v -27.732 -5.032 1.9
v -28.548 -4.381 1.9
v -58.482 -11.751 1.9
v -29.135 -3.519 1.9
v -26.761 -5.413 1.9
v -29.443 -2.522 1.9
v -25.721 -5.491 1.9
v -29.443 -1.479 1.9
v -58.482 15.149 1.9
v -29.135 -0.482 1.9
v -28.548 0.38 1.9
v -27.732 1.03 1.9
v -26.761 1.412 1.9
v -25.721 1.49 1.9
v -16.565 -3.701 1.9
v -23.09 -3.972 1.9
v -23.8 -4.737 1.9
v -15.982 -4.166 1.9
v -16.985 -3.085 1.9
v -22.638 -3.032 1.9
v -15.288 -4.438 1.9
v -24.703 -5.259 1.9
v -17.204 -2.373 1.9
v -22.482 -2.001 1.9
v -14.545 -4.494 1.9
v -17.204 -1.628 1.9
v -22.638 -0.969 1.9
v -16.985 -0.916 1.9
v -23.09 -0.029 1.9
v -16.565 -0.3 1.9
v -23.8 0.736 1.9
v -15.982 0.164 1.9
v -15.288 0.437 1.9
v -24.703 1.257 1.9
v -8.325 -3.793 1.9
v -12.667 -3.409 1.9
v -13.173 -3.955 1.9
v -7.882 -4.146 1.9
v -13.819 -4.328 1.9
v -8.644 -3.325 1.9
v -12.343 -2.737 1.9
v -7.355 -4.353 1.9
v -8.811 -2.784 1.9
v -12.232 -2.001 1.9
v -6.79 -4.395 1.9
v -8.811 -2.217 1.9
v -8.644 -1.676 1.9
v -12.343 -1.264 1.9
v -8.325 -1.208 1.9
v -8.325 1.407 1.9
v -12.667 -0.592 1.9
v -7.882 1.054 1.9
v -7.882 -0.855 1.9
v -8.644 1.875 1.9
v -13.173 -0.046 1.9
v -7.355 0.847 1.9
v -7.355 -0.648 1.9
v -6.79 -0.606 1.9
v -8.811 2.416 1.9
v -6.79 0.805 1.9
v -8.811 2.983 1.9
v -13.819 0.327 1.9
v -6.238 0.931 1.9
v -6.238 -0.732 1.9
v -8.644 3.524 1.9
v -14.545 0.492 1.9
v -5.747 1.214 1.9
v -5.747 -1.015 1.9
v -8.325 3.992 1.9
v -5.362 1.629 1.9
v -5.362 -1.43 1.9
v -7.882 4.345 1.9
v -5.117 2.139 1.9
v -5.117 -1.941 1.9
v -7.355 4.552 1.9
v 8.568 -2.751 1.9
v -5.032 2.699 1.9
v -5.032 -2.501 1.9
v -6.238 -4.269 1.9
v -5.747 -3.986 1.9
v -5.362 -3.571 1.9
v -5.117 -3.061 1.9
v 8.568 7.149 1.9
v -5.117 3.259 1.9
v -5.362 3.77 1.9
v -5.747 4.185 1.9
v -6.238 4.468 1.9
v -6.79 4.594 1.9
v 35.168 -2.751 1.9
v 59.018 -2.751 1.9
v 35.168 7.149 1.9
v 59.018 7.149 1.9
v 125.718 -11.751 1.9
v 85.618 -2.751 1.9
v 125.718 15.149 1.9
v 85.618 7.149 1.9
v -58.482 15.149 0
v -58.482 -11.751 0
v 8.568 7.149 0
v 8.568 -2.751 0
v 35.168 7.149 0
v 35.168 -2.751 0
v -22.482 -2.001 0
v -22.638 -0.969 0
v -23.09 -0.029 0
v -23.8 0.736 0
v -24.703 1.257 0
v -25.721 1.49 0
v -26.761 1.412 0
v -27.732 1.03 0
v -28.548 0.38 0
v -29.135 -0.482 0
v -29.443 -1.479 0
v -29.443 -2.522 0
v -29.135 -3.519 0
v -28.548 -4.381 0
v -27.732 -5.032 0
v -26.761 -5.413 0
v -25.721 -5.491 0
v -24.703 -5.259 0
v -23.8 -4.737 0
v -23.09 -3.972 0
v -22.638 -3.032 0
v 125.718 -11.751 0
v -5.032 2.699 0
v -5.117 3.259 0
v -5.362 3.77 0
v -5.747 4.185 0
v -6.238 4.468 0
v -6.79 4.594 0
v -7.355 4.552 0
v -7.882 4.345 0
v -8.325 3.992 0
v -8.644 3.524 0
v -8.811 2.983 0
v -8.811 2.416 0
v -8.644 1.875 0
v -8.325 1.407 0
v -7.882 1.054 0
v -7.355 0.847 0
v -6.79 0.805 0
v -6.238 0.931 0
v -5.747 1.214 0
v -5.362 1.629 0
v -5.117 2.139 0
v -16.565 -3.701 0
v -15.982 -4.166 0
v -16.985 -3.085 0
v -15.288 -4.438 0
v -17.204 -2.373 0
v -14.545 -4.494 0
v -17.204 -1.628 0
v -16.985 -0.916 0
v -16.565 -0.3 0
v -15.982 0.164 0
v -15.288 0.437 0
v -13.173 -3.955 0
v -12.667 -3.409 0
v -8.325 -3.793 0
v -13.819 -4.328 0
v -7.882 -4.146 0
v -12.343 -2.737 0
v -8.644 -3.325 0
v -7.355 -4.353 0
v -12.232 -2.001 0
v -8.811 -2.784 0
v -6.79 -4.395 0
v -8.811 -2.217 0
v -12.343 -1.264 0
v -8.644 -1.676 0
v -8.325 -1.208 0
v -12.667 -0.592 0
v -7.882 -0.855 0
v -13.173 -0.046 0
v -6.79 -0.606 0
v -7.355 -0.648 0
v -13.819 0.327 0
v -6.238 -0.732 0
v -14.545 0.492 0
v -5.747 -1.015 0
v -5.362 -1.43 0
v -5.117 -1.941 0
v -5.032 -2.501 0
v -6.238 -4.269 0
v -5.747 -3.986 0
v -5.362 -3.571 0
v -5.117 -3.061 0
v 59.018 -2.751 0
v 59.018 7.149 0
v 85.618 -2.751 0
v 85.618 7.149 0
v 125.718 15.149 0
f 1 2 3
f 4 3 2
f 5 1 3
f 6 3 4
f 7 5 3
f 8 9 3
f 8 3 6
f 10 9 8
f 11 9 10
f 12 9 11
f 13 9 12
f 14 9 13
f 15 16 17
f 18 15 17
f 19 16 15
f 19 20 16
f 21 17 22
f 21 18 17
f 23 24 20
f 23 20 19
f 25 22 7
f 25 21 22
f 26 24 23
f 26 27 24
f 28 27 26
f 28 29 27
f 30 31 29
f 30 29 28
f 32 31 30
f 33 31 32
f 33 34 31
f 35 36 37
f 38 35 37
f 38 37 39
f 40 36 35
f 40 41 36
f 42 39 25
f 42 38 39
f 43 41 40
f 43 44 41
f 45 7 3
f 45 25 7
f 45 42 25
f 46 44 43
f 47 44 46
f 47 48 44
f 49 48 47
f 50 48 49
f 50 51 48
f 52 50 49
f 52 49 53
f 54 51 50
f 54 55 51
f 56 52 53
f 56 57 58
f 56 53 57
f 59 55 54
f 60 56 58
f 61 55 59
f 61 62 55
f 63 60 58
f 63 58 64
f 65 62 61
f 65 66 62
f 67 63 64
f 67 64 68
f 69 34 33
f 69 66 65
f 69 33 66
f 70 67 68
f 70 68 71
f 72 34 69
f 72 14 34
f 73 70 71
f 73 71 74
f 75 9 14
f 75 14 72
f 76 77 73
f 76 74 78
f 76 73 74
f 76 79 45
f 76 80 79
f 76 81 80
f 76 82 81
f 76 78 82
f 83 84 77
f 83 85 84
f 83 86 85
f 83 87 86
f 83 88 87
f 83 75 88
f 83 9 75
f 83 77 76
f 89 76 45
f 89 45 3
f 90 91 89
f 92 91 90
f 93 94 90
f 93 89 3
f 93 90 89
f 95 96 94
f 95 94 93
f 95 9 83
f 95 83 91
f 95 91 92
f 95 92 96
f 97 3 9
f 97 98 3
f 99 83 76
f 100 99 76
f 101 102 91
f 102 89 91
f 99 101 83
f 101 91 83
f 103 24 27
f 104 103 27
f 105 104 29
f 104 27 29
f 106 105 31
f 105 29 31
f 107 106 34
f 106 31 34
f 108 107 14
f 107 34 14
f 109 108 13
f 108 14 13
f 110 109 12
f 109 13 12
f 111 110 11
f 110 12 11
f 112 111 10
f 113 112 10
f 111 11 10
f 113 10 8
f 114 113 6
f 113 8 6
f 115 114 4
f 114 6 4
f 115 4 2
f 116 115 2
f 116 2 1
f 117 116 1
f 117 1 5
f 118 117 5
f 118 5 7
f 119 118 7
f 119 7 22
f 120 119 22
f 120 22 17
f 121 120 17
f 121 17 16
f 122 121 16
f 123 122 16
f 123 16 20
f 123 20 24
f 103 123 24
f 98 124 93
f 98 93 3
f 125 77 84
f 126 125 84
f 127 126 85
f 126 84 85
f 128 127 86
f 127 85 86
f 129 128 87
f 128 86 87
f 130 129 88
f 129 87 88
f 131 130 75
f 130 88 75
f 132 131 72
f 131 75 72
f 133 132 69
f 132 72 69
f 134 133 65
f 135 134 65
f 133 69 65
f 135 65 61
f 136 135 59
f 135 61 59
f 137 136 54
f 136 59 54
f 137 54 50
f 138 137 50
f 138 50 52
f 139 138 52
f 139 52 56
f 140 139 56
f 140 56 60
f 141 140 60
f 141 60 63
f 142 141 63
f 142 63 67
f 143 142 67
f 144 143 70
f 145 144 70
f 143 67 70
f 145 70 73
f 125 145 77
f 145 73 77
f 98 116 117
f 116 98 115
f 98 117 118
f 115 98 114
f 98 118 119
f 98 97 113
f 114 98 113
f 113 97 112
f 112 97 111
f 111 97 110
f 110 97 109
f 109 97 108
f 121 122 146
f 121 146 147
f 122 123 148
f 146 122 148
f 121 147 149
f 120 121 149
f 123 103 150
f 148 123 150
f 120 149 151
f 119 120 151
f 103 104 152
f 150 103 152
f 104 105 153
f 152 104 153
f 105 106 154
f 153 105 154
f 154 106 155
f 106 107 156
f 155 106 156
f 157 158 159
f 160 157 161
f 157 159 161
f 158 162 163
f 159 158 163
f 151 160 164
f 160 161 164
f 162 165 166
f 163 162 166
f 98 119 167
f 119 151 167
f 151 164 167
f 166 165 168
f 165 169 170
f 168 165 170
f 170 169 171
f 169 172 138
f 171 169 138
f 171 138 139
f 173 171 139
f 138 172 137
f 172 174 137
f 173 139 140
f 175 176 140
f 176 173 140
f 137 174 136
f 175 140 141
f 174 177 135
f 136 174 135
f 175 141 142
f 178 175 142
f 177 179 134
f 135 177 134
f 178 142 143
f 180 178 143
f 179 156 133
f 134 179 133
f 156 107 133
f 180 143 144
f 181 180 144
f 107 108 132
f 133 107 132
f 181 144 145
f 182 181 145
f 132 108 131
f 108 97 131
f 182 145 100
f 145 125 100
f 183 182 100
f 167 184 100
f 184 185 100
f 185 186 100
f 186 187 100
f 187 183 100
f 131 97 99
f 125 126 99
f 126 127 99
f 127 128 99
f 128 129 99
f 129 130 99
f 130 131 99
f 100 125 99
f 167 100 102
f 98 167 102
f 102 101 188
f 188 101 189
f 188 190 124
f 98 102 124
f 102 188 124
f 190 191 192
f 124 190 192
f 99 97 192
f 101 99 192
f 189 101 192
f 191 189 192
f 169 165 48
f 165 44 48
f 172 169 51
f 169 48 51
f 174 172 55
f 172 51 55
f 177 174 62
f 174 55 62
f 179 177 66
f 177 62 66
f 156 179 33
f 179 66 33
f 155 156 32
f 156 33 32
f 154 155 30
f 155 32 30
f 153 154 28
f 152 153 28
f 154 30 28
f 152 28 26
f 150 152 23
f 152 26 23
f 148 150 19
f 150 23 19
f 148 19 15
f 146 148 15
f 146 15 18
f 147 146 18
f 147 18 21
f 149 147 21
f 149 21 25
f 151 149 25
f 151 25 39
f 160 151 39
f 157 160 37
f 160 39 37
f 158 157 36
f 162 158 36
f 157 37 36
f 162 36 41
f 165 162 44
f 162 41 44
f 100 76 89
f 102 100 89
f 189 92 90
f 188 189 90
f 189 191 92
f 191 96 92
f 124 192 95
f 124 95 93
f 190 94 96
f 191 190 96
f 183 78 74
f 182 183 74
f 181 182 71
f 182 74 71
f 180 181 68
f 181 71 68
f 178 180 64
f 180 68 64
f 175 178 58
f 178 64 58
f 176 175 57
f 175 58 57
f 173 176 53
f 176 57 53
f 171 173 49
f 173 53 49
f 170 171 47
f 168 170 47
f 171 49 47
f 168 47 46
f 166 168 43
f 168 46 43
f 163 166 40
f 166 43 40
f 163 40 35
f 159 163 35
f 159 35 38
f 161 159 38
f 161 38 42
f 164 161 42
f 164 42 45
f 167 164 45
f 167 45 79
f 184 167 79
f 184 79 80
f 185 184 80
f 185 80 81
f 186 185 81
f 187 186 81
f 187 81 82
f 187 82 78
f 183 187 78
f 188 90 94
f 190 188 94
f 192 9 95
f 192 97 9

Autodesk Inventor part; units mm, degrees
ref_plane "YZ Plane" through (0, 0, 0) normal (1, 0, 0) x (0, 1, 0)
ref_plane "XZ Plane" through (0, 0, 0) normal (0, 1, 0) x (-1, 0, 0)
ref_plane "XY Plane" through (0, 0, 0) normal (0, 0, 1) x (1, 0, 0)
sketch "Sketch1" plane through (0, 0, 0) normal (0, 0, 1) x (1, 0, 0)
  line L0 (-58.4821, 15.1494) -> (125.7179, 15.1494)
  line L1 (125.7179, 15.1494) -> (125.7179, -11.7506)
  line L2 (125.7179, -11.7506) -> (-58.4821, -11.7506)
  line L3 (-58.4821, -11.7506) -> (-58.4821, 15.1494)
  point P0 (0, 0)
  dimension "d0" = 184.2
  dimension "d2" = 26.9
extrude "Extrusion1" add sketch "Sketch1" along normal blind 1.9
sketch "Sketch5" plane through (0, 0, 1.9) normal (0, 0, 1) x (1, 0, 0)
  line L0 (-58.4821, 15.1494) -> (-58.4821, -11.7506) projected
  line L1 (-58.4821, -11.7506) -> (125.7179, -11.7506) projected
  line L2 (125.7179, -11.7506) -> (125.7179, 15.1494) projected
  circle A0 centre (-25.9821, -2.0006) radius 3.5
  circle A1 centre (-14.7321, -2.0006) radius 2.5
  circle A2 centre (-6.9321, -2.5006) radius 1.9
  circle A3 centre (-6.9321, 2.6994) radius 1.9
  line L3 (8.5679, -2.7506) -> (35.1679, -2.7506)
  line L4 (35.1679, -2.7506) -> (35.1679, 7.1494)
  line L5 (35.1679, 7.1494) -> (8.5679, 7.1494)
  line L6 (8.5679, 7.1494) -> (8.5679, -2.7506)
  line L7 (59.0179, -2.7506) -> (85.6179, -2.7506)
  line L8 (85.6179, -2.7506) -> (85.6179, 7.1494)
  line L9 (85.6179, 7.1494) -> (59.0179, 7.1494)
  line L10 (59.0179, 7.1494) -> (59.0179, -2.7506)
  point P0 (0, 0)
  dimension "d56" = 7
  dimension "d58" = 5
  dimension "d59" = 32.5
  dimension "d60" = 43.75
  dimension "d61" = 9.75
  dimension "d62" = 9.75
  dimension "d63" = 3.8
  dimension "d64" = 3.8
  dimension "d65" = 51.55
  dimension "d66" = 51.55
  dimension "d67" = 9.25
  dimension "d68" = 14.45
  dimension "d69" = 26.6
  dimension "d70" = 26.6
  dimension "d71" = 9.9
  dimension "d72" = 9.9
  dimension "d73" = 9
  dimension "d74" = 9
  dimension "d75" = 117.15
  dimension "d76" = 66.7
extrude "Extrusion3" cut sketch "Sketch5" against normal through all
equation "\"BendRadius\" = Thickness"
equation "\"BendReliefWidth\" = Thickness"
equation "\"BendReliefDepth\" = 0.5 * Thickness"
equation "\"CornerReliefSize\" = 4 * Thickness"
equation "\"MinimumRemnant\" = 2 * Thickness"
equation "\"TransitionRadius\" = BendRadius"
equation "\"JacobiRadiusSize\" = BendRadius"
equation "\"GapSize\" = Thickness"
equation "\"Thickness\" = 0.5"
properties part number "panel"
